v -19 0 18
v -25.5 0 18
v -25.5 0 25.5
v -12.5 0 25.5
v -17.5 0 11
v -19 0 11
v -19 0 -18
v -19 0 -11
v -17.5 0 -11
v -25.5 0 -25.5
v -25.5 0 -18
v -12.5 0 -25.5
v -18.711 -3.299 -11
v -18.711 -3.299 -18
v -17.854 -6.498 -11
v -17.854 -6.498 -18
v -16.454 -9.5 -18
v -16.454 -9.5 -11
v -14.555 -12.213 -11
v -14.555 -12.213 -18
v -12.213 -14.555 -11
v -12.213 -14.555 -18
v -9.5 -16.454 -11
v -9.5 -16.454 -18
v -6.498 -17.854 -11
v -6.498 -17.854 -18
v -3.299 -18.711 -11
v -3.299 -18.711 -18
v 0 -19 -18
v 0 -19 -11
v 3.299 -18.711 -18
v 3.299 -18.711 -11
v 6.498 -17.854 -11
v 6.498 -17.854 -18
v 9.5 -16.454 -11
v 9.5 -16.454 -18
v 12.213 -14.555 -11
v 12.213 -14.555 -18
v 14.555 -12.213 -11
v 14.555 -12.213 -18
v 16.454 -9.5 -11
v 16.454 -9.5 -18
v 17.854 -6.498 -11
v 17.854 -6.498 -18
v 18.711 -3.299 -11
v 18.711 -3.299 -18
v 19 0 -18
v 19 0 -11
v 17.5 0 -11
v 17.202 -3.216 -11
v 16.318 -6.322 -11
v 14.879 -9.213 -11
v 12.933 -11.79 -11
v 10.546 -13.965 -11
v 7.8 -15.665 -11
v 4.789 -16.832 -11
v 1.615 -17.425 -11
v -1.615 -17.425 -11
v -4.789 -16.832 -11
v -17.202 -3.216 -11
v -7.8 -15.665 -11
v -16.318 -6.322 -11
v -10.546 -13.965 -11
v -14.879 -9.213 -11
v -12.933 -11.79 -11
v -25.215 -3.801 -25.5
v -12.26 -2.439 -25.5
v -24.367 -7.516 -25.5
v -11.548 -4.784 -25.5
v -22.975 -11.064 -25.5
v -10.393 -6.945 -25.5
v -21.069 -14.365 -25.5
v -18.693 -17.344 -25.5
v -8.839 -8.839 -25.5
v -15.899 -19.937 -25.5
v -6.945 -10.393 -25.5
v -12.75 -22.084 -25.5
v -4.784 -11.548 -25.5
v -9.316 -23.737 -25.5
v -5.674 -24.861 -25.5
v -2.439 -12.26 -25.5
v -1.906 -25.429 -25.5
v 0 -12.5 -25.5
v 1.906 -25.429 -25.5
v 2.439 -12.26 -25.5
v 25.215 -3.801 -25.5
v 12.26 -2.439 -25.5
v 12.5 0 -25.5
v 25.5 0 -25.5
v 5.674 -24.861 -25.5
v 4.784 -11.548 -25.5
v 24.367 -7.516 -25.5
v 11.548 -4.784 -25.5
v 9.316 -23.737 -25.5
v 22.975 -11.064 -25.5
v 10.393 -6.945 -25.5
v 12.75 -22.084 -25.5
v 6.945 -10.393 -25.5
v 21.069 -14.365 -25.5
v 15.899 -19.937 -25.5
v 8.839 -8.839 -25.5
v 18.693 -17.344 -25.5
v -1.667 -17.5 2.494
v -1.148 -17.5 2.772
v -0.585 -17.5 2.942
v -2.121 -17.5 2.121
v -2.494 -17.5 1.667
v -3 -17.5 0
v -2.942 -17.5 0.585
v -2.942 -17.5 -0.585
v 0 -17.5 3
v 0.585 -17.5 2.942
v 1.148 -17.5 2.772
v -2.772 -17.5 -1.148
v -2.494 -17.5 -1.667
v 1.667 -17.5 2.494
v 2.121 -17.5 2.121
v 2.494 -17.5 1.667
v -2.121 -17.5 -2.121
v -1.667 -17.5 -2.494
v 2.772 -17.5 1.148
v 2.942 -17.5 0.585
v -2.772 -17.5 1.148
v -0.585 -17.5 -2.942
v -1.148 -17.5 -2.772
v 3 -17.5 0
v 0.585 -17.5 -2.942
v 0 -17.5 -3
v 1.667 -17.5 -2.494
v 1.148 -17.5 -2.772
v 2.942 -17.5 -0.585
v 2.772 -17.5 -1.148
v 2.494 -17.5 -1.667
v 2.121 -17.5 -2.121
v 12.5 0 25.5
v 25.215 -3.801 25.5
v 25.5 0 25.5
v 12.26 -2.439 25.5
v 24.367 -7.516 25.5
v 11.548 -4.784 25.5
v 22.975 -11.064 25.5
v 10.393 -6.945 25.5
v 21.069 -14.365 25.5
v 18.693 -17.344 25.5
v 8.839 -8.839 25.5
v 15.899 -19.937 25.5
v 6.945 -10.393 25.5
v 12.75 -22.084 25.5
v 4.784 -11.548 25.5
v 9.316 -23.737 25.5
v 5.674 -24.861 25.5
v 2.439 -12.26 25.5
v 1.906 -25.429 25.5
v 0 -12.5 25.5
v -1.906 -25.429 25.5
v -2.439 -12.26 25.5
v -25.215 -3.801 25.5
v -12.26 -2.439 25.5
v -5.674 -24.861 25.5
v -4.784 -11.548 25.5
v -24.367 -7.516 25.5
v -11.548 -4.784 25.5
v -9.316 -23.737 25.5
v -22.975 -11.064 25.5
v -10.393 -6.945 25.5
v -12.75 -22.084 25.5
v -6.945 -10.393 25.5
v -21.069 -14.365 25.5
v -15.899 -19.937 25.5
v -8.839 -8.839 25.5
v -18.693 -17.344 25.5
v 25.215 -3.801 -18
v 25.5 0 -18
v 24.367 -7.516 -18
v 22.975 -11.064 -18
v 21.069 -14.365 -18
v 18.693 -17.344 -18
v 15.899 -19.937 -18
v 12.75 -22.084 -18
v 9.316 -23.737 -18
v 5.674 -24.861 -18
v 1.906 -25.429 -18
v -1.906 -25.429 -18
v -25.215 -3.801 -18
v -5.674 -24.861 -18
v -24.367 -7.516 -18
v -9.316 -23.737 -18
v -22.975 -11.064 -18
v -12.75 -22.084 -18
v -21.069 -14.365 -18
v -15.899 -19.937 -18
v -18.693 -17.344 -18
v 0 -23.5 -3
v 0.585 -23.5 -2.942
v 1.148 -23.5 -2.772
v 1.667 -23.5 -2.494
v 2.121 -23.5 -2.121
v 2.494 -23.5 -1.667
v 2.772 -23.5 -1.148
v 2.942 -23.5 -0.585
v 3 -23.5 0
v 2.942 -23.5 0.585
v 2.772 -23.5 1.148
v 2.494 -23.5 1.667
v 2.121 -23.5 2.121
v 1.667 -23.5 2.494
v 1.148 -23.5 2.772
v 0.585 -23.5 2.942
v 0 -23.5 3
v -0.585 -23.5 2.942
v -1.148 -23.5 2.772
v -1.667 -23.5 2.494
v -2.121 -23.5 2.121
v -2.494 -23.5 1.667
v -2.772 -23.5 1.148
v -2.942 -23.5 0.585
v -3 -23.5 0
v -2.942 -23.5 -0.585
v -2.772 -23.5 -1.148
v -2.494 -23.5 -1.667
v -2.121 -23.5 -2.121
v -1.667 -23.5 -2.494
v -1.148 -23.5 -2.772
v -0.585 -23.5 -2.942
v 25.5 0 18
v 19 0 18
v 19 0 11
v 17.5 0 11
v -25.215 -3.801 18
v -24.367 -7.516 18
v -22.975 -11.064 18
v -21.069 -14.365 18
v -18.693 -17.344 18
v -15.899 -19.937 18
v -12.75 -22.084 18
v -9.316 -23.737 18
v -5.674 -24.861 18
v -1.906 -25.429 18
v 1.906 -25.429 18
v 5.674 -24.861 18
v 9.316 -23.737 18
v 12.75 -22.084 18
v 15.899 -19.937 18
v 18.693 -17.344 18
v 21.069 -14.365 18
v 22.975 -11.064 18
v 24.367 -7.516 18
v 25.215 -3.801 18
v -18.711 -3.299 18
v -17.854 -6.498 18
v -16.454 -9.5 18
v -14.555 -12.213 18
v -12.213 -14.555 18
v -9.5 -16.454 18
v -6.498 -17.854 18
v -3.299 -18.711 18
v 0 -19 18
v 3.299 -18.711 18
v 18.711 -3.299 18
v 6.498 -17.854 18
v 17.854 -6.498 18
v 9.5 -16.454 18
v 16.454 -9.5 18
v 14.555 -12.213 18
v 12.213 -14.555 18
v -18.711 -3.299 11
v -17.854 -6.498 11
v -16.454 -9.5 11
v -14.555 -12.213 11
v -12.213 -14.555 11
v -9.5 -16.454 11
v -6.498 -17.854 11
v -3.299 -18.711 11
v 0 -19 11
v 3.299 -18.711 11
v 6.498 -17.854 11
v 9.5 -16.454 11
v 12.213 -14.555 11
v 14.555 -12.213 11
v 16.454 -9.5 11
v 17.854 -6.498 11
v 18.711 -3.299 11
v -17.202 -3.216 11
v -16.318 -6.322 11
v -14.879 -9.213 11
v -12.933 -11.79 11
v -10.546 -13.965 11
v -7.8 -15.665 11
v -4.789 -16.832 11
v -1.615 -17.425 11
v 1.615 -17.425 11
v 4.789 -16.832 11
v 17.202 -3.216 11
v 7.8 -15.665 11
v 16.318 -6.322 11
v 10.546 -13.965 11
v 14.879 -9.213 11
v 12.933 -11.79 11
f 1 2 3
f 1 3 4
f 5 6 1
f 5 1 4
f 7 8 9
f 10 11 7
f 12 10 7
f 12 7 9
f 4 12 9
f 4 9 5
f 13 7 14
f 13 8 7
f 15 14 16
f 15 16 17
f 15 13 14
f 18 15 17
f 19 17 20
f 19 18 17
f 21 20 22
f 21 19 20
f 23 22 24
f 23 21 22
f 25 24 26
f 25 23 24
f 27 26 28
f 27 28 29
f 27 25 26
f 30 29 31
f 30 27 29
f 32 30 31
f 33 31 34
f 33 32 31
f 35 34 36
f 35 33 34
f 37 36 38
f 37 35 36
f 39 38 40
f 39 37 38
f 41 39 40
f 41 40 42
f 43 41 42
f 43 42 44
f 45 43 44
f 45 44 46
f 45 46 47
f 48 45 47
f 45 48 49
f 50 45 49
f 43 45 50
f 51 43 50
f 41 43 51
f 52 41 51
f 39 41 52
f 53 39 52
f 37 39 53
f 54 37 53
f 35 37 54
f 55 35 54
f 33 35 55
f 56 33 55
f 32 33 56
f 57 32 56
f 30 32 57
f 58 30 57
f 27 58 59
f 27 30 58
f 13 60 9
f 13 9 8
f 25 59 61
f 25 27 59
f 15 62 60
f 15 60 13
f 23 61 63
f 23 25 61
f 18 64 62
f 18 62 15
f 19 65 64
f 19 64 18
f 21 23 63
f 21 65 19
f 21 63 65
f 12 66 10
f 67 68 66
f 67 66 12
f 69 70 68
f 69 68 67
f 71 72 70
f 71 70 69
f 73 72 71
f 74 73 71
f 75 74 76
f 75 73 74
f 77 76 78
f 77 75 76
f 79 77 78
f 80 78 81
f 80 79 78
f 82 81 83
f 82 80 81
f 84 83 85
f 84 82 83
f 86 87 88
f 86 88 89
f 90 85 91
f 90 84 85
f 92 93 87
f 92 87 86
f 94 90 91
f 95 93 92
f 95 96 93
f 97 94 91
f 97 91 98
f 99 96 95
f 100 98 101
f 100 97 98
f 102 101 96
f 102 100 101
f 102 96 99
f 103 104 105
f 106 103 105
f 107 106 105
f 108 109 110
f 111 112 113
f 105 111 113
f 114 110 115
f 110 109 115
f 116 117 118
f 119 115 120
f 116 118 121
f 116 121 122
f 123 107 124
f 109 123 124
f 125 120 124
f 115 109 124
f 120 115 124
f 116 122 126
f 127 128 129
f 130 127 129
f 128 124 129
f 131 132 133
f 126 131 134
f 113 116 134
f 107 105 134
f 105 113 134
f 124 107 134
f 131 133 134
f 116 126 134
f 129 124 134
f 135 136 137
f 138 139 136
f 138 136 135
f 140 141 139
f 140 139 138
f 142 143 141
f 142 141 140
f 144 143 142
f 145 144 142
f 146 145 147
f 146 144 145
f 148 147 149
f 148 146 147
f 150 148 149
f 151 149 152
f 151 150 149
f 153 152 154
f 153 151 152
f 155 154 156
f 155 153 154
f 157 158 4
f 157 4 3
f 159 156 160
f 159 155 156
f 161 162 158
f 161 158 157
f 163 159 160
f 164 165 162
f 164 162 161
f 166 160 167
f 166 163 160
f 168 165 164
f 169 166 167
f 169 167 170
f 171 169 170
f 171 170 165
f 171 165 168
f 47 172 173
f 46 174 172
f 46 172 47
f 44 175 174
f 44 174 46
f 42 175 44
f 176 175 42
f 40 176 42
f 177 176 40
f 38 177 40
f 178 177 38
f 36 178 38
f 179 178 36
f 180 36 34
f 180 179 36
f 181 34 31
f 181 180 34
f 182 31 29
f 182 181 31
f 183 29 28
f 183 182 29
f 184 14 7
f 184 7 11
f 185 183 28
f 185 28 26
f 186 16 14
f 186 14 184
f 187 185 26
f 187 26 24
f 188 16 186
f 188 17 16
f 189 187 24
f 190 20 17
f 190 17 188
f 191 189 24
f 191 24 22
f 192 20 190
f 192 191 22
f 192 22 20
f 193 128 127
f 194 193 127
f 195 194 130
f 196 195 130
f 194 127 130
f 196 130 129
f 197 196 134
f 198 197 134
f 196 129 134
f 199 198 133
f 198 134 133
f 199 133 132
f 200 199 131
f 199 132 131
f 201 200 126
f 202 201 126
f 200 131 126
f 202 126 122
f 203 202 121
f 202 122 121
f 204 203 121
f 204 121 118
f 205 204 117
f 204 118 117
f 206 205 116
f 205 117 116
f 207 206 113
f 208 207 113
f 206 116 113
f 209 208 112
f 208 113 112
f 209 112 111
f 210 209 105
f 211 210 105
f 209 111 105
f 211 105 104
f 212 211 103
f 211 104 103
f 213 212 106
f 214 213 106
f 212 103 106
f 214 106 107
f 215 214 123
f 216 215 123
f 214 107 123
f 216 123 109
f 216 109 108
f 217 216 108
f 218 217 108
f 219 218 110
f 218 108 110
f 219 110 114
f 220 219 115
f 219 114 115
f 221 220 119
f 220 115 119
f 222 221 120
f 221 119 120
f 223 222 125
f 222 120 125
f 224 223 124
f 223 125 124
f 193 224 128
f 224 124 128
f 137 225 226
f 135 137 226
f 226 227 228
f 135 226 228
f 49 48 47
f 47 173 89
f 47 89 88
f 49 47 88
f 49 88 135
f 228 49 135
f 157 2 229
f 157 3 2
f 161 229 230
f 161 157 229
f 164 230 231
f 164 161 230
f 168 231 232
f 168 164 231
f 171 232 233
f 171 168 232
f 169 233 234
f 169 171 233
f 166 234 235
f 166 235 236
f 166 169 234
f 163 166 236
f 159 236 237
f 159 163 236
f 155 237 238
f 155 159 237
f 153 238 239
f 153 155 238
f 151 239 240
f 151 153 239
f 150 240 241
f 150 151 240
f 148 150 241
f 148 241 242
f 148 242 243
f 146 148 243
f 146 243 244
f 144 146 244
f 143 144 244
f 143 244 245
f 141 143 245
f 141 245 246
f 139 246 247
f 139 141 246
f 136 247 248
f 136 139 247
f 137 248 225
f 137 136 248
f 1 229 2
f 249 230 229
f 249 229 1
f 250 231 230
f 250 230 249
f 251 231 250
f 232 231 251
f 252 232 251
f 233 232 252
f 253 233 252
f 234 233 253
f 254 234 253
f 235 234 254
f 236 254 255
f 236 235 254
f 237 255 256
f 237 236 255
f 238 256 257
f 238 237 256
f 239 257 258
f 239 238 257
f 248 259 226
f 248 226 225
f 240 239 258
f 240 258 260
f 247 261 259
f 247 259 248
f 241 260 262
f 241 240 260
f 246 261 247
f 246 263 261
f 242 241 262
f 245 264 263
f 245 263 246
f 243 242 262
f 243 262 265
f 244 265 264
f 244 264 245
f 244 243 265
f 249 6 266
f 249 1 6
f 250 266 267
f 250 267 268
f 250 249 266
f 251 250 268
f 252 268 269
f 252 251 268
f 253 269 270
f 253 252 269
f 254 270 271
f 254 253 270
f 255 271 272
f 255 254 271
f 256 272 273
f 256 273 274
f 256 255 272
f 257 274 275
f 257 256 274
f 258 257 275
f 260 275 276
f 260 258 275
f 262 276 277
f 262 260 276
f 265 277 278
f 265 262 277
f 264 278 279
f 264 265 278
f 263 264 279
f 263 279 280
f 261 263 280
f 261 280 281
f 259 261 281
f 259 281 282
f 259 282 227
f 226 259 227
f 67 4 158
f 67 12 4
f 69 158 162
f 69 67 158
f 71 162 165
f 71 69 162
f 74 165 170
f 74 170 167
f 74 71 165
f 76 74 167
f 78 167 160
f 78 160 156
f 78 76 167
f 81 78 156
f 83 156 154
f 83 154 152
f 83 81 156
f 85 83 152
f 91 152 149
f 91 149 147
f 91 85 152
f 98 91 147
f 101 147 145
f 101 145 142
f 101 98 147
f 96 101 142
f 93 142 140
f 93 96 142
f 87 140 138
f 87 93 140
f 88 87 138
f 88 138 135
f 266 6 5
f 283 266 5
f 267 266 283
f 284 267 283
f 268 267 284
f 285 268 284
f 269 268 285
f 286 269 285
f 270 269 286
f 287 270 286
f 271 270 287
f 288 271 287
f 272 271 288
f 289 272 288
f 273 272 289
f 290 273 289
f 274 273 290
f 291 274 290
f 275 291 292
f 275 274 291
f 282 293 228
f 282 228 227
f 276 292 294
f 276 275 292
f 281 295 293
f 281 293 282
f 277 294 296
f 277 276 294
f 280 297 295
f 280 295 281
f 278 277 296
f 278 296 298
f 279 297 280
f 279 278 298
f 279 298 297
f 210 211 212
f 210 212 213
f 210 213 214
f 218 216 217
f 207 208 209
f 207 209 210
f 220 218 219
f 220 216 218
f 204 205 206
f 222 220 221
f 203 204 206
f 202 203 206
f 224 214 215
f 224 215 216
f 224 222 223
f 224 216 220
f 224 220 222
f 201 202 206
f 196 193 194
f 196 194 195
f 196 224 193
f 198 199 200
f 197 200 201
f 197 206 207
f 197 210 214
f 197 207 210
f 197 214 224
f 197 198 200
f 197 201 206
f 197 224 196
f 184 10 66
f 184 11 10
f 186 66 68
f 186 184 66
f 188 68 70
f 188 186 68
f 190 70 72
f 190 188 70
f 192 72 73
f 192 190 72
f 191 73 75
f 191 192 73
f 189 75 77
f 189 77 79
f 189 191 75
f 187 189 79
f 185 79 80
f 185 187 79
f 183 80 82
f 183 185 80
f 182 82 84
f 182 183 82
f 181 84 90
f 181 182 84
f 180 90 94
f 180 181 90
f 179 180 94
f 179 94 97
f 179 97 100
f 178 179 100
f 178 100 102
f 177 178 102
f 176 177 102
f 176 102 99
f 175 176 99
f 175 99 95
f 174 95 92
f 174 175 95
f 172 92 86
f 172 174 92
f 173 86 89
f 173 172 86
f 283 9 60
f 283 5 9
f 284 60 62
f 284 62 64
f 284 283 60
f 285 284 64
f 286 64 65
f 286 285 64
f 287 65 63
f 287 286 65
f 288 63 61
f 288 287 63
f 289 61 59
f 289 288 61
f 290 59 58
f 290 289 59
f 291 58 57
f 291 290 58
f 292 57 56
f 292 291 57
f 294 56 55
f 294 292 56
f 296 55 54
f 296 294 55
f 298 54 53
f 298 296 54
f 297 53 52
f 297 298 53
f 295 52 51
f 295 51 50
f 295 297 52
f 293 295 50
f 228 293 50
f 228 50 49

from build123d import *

# Parameters (mm, degrees)
REVOLVE1_ANGLE      = 180
SKETCH2_R           = 3
BOSS_EXTRUDE1_DEPTH = 6


with BuildPart() as part:
    # Sketch1 → Revolve1 (revolve)
    with BuildSketch(Plane(origin=(0, 0, 0), x_dir=(1, 0, 0), z_dir=(0, 1, 0))):
        Polygon((-25.5, 25.5), (-25.5, 18), (-19, 18), (-19, 11), (-17.5, 11), (-17.5, -11), (-19, -11), (-19, -18), (-25.5, -18), (-25.5, -25.5), (-12.5, -25.5), (-12.5, 25.5), align=None)
    revolve(axis=Axis((0, 0, 0), (0, 0, 1)), revolution_arc=REVOLVE1_ANGLE)


with BuildPart() as body_2:
    # Sketch2 → Boss-Extrude1 (new body)
    with BuildSketch(Plane(origin=(0, -17.5, 0), x_dir=(-1, 0, 0), z_dir=(0, -1, 0))):
        with Locations(Location((0, 0, 0), (0, 0, 90))):  # turned: the seam where the file's is
            Circle(SKETCH2_R)
    extrude(amount=BOSS_EXTRUDE1_DEPTH)


solid = Compound([part.part, body_2.part])
